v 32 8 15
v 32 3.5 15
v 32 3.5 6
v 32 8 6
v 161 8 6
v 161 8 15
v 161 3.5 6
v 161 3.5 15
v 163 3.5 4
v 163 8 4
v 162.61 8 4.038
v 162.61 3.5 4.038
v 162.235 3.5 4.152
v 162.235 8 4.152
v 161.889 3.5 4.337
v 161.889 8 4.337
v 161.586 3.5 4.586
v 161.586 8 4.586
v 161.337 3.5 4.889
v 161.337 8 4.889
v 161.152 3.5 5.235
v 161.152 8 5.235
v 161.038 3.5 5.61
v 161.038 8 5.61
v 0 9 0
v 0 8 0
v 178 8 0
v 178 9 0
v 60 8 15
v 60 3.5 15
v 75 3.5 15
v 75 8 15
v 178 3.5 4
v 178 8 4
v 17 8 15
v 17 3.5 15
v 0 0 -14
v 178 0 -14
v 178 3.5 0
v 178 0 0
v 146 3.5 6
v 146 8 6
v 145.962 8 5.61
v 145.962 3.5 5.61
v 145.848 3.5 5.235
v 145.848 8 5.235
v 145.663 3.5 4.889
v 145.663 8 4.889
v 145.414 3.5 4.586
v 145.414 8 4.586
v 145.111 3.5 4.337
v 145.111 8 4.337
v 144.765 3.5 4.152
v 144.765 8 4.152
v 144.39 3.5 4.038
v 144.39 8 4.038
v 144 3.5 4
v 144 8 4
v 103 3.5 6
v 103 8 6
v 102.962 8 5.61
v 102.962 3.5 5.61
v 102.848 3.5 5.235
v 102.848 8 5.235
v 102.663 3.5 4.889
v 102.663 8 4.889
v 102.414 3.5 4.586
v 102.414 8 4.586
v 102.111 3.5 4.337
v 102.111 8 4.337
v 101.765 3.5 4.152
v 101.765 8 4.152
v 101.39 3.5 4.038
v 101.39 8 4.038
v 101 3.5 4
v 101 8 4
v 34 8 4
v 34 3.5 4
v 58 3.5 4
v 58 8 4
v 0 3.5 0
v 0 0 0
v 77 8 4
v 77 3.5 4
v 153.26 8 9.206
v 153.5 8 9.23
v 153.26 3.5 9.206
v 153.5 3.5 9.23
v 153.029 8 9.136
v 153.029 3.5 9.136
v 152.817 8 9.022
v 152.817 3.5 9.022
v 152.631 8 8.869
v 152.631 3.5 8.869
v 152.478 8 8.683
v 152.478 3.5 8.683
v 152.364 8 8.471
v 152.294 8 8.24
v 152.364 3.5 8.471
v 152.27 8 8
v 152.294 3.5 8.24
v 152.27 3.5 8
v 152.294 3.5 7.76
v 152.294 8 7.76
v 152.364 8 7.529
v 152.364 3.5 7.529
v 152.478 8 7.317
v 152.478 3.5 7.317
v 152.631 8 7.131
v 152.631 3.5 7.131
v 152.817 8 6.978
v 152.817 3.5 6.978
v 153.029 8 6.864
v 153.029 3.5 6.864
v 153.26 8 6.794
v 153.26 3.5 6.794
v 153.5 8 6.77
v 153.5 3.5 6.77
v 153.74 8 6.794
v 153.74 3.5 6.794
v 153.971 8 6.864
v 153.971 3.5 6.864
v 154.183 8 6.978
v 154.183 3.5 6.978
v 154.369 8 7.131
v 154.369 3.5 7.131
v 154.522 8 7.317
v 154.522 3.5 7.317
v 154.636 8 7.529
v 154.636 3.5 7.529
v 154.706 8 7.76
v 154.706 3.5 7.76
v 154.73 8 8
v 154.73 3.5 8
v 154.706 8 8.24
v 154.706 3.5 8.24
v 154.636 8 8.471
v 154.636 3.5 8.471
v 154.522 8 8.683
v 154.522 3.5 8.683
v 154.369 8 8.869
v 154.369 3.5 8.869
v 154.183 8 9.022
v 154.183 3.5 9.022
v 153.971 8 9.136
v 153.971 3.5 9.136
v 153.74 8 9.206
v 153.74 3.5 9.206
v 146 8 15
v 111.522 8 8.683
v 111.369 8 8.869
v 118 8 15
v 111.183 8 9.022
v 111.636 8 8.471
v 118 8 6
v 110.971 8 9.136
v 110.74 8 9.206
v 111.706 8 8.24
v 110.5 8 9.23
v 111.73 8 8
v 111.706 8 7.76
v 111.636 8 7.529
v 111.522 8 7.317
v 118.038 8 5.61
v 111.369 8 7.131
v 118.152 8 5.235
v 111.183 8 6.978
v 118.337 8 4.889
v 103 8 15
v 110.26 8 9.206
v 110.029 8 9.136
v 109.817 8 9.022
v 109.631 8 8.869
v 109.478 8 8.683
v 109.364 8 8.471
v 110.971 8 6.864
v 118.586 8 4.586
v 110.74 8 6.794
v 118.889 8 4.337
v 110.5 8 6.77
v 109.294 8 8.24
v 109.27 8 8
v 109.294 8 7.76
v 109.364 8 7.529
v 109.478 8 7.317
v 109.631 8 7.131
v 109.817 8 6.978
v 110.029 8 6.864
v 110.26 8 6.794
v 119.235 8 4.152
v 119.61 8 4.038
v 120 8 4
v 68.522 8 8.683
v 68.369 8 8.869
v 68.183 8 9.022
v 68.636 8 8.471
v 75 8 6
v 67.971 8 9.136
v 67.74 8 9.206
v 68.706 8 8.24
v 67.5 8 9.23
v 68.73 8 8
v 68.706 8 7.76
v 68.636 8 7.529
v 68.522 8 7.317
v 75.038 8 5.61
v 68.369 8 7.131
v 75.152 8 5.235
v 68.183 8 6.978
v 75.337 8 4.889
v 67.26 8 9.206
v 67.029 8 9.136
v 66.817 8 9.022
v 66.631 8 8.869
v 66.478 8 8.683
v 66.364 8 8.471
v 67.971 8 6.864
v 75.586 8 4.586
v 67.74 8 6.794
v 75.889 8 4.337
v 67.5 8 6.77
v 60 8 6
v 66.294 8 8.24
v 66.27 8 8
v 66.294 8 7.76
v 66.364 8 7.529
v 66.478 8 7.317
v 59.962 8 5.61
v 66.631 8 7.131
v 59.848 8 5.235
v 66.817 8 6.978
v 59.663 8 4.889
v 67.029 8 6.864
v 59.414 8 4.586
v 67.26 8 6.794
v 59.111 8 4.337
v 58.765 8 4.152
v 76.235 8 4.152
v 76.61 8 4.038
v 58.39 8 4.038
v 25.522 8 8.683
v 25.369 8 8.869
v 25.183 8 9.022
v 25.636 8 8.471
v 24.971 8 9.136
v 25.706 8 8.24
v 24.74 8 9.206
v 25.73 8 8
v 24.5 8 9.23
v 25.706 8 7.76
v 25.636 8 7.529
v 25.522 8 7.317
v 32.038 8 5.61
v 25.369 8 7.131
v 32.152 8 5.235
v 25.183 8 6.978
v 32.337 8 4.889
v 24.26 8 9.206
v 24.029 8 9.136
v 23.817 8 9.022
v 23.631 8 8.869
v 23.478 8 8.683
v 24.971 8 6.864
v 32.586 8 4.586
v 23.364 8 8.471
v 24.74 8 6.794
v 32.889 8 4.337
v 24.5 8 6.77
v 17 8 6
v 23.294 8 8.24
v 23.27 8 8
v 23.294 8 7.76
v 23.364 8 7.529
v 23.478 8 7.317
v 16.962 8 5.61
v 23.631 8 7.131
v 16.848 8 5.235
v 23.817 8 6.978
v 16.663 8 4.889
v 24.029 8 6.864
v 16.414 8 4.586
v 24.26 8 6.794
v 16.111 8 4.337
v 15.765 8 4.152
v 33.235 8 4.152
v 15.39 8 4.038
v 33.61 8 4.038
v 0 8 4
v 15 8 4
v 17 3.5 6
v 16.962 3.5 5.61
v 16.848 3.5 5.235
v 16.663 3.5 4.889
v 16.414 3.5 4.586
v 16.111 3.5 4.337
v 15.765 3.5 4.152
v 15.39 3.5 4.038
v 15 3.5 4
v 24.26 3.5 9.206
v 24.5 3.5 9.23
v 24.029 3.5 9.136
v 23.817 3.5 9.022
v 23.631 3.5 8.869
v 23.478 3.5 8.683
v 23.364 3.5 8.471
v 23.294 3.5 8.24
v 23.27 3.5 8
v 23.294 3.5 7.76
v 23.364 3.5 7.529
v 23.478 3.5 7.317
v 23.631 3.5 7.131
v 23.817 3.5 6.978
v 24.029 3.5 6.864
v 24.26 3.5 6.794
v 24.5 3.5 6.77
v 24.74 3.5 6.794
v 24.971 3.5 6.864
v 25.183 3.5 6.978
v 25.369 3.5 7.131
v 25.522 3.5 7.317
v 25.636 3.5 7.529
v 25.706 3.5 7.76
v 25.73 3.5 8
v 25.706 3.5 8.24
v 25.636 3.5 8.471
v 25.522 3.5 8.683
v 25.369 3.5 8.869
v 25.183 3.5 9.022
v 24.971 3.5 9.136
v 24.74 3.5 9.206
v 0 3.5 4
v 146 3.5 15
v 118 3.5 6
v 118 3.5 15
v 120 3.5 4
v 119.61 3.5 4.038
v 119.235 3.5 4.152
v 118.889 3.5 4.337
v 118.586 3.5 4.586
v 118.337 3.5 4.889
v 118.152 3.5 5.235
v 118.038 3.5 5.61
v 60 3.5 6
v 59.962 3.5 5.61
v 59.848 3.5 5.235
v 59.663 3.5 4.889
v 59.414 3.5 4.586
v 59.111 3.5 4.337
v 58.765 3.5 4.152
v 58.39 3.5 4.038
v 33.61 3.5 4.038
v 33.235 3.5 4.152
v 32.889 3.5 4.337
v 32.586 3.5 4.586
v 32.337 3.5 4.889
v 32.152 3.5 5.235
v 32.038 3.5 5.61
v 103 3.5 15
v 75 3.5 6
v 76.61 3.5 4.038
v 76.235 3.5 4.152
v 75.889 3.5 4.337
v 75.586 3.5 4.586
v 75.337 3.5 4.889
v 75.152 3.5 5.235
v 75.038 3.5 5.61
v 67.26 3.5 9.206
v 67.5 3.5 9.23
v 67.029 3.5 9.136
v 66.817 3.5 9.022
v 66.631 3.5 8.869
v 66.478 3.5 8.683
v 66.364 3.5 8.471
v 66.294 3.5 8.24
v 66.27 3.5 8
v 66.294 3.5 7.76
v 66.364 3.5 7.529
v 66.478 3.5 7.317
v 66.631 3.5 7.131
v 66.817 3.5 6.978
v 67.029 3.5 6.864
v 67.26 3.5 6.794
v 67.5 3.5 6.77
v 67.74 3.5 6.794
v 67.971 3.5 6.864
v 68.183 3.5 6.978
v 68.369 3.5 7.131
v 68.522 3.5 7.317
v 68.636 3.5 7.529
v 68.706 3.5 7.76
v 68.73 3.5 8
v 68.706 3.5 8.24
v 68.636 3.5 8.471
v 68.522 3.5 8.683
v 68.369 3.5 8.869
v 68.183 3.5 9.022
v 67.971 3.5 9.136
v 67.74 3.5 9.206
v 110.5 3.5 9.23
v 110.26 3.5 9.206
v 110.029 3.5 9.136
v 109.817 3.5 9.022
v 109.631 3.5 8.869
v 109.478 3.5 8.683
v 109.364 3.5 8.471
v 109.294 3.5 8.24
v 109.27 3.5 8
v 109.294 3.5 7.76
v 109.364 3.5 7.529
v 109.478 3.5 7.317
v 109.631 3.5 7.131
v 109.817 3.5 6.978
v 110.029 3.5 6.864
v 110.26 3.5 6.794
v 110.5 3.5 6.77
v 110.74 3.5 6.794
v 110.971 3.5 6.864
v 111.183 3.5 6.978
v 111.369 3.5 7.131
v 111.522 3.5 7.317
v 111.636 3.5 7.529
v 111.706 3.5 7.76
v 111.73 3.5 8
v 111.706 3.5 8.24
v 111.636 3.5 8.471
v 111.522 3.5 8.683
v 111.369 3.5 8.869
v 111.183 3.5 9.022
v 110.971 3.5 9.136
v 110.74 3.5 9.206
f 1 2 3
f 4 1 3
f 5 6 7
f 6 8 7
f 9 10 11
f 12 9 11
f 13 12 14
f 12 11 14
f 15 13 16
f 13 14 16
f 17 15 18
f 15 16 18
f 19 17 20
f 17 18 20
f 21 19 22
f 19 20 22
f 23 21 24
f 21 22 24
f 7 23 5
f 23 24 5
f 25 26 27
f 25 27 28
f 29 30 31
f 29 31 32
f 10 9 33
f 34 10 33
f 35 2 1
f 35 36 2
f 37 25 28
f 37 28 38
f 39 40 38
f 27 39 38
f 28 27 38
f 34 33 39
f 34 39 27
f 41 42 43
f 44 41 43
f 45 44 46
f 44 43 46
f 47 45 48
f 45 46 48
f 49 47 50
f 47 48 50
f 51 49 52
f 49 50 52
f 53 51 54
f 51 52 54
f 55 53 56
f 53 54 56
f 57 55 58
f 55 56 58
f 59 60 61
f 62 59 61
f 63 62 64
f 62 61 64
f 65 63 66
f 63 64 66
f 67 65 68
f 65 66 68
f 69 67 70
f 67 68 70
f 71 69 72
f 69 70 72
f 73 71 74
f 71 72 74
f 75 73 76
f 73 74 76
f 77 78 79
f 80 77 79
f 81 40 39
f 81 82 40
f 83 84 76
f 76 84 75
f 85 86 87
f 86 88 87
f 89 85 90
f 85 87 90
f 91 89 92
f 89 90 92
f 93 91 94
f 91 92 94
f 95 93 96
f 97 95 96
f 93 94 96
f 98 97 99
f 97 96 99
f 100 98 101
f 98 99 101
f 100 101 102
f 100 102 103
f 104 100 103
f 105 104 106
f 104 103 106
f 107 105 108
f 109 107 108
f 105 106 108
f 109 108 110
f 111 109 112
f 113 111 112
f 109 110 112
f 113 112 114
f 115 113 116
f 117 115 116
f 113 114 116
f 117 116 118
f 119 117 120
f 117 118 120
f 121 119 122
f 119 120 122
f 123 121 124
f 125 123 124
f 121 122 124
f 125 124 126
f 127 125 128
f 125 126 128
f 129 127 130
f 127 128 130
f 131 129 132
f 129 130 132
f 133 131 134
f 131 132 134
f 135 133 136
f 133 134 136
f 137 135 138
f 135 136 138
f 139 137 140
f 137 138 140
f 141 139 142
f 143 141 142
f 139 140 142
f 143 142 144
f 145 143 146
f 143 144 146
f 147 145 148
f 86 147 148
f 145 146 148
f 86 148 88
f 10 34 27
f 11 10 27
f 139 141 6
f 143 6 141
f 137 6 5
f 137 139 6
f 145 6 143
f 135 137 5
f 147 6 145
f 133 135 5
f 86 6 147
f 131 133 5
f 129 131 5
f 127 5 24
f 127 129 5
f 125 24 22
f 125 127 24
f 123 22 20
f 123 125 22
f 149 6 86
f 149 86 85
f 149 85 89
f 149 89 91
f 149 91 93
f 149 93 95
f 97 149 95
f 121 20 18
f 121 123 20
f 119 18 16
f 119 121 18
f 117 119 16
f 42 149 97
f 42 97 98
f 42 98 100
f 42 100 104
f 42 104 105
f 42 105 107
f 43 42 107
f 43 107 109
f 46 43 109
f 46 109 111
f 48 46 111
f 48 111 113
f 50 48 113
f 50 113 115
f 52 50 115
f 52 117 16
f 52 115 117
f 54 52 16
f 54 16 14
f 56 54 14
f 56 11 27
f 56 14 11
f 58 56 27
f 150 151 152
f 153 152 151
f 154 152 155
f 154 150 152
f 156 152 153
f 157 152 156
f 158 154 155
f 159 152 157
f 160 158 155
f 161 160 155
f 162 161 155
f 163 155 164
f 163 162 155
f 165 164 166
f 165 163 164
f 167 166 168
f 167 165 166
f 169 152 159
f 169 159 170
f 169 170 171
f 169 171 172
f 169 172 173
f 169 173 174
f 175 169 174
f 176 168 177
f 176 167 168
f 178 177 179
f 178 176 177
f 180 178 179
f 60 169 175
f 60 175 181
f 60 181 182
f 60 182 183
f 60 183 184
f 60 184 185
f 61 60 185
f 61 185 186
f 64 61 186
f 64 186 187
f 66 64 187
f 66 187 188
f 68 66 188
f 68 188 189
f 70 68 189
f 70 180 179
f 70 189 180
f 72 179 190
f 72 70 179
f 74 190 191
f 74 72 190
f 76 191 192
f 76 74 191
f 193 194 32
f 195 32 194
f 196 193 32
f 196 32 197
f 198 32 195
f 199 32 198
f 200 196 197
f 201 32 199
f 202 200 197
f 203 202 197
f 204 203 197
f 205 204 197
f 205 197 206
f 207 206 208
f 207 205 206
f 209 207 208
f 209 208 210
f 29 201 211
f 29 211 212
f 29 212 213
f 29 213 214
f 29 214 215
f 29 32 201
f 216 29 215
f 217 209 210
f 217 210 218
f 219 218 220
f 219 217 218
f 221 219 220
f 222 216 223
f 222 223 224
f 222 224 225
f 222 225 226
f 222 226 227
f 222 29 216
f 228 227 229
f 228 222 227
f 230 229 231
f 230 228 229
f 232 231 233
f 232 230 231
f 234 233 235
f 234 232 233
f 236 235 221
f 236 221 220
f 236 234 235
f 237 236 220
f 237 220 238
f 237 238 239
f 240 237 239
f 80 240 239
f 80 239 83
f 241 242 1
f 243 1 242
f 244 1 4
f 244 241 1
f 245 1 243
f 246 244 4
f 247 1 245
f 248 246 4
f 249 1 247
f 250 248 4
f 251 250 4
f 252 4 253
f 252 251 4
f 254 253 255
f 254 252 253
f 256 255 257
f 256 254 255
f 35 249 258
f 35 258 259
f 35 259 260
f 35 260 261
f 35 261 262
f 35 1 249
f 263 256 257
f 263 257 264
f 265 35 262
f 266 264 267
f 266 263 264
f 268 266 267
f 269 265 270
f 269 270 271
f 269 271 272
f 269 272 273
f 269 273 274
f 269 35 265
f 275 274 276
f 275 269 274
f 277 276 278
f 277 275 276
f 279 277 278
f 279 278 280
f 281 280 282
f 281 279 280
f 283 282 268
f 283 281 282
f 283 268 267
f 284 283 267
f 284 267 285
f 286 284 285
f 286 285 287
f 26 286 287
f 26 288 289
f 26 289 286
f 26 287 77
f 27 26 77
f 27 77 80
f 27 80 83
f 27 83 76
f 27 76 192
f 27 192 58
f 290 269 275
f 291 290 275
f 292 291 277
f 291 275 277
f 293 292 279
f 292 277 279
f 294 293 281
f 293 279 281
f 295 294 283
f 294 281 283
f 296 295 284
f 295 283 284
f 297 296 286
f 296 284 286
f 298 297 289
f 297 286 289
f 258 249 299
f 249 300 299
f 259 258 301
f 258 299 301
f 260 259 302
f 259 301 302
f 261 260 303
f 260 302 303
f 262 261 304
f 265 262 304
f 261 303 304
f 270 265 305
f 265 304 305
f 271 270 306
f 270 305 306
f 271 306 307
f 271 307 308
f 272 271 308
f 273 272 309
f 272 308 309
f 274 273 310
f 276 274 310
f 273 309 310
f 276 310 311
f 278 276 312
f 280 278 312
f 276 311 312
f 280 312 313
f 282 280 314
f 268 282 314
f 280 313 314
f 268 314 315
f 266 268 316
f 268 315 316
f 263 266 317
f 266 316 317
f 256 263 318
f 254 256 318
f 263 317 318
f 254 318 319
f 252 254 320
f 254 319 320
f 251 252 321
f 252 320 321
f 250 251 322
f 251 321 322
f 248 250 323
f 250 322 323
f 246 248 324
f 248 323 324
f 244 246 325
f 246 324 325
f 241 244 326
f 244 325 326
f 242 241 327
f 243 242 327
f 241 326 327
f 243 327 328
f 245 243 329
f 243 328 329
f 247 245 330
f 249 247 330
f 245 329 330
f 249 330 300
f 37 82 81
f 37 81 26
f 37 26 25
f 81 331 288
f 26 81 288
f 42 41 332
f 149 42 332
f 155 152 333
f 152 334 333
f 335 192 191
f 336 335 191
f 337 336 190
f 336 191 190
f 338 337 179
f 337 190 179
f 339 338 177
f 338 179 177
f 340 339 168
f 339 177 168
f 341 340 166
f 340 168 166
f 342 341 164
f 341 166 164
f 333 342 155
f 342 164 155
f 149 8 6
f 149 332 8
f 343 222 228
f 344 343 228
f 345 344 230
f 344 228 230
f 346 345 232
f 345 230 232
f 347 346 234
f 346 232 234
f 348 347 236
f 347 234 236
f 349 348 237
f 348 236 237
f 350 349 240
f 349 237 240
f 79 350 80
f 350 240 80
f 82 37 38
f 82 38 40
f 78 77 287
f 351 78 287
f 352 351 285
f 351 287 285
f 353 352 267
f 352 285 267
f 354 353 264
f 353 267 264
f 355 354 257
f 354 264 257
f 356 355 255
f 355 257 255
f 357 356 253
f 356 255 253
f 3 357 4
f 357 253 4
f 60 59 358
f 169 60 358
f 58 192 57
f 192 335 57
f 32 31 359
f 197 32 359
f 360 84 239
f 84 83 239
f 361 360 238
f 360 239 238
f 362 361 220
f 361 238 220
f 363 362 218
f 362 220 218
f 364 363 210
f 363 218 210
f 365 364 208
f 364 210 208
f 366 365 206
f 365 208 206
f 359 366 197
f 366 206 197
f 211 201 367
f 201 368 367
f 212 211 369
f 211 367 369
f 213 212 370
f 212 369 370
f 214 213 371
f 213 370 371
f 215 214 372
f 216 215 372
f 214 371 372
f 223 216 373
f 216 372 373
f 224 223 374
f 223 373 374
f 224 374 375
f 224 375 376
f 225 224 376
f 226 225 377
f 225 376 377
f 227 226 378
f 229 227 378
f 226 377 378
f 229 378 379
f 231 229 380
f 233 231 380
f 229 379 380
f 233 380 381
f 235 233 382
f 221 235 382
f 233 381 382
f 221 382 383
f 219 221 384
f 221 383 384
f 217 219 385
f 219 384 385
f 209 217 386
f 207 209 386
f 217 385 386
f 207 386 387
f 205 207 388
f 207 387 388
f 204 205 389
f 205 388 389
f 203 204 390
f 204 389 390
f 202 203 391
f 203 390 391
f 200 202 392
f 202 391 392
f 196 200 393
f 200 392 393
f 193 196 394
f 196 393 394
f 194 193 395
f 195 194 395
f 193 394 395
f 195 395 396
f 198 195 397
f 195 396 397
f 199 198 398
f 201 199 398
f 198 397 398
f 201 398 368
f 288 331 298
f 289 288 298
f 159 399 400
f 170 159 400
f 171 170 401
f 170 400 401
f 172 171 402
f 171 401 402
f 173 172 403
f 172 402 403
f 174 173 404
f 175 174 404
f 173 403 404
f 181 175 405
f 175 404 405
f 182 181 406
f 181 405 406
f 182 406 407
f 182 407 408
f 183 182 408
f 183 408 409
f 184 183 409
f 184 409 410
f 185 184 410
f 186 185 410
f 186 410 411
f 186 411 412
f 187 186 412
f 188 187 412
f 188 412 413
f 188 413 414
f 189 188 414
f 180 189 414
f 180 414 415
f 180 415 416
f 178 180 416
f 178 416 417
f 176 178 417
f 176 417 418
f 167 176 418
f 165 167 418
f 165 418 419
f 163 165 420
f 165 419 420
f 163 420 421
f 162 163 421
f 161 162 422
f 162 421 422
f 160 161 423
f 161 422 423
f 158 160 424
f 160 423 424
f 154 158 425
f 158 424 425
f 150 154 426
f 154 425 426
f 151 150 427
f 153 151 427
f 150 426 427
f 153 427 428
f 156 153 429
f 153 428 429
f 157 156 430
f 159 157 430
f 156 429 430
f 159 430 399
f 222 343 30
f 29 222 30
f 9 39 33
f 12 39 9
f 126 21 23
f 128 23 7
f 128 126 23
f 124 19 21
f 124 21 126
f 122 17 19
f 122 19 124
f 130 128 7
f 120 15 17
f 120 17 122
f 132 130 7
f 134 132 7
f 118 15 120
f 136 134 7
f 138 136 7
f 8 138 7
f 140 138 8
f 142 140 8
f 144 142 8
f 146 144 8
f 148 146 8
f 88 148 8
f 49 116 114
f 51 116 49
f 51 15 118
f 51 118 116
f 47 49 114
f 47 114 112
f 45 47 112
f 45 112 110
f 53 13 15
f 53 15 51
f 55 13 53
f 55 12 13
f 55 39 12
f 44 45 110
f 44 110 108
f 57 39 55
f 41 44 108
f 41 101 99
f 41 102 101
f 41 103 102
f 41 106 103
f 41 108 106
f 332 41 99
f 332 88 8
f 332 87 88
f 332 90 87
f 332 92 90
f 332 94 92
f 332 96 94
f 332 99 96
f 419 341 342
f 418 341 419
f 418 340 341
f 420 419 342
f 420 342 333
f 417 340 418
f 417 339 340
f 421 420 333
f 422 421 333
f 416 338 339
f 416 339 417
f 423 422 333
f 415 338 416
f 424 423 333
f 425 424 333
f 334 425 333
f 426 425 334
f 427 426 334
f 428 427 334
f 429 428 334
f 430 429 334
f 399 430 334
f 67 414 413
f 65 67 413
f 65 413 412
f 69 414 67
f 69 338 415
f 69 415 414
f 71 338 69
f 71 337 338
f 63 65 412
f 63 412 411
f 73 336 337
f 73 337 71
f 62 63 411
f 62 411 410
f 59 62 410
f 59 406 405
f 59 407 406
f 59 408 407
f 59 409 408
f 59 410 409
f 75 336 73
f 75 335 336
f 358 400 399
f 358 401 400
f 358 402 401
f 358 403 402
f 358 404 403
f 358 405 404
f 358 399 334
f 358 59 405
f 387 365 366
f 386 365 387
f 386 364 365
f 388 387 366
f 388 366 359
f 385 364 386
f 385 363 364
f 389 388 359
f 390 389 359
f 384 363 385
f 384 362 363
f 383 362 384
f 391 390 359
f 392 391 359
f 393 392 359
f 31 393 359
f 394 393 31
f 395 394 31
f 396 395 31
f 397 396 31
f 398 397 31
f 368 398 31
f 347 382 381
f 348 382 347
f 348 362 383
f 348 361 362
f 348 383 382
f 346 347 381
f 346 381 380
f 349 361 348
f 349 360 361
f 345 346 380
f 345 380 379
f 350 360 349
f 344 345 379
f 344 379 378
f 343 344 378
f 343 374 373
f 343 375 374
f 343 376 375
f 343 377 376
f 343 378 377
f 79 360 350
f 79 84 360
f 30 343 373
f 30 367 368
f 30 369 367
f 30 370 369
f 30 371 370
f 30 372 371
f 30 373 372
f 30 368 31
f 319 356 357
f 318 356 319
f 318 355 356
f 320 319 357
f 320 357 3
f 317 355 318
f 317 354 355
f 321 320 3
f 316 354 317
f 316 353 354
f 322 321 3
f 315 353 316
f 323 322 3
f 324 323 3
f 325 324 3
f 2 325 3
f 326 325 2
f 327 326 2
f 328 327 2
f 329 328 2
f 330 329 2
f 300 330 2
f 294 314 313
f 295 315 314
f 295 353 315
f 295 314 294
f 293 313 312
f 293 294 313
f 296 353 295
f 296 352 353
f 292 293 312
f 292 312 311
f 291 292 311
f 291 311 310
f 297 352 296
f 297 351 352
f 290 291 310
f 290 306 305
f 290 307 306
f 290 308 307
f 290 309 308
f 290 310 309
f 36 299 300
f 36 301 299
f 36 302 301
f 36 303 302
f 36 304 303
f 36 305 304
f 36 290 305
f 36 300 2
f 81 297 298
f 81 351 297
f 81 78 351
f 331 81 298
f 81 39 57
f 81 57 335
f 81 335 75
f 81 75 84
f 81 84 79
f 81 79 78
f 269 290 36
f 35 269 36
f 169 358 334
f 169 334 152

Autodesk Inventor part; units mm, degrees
ref_plane "YZ Plane" through (0, 0, 0) normal (1, 0, 0) x (0, 1, 0)
ref_plane "XZ Plane" through (0, 0, 0) normal (0, 1, 0) x (-1, 0, 0)
ref_plane "XY Plane" through (0, 0, 0) normal (0, 0, 1) x (1, 0, 0)
sketch "Sketch3" plane through (0, 0, 0) normal (1, 0, 0) x (0, 1, 0)
  line L0 (0, 0) -> (9, 0)
  line L1 (9, 0) -> (9, -14)
  line L2 (9, -14) -> (0, -14)
  line L3 (0, -14) -> (0, 0)
  line L4 (9, 0) -> (0, -14)
  line L5 (8, 0) -> (3.5, 0)
  line L6 (3.5, 0) -> (3.5, 15)
  line L7 (3.5, 15) -> (8, 15)
  line L8 (8, 15) -> (8, 0)
  line L9 (8.5, 0) -> (8, 0)
  line L10 (8, 0) -> (8, 4)
  point P0 (3.5, 0)
  dimension "d30" = 15
  dimension "d31" = 4.5
  dimension "d63" = 9
  dimension "d141" = 32.735
  dimension "d142" = 14
  dimension "d143" = 3.5
  dimension "d144" = 1
extrude "Extrusion2" add sketch "Sketch3" along normal blind 178 contours L0 L4 L3 | L6 L7 L8 L0
sketch "Sketch10" plane through (0, 3.5, -14) normal (0, -1, 0) x (1, 0, 0)
  line L0 (0, 14) -> (0, 26)
  line L1 (0, 26) -> (178, 26)
  line L2 (178, 14) -> (178, 26)
  line L3 (0, 14) -> (0, 18)
  line L4 (0, 18) -> (17, 18)
  line L5 (17, 18) -> (17, 26)
  line L6 (17, 26) -> (0, 26)
  line L7 (0, 26) -> (0, 18)
  line L8 (0, 18) -> (178, 18)
  line L9 (178, 26) -> (161, 26)
  line L10 (161, 26) -> (161, 18)
  line L11 (161, 18) -> (178, 18)
  line L12 (178, 18) -> (178, 26)
  line L13 (17, 26) -> (32, 26)
  line L14 (32, 26) -> (32, 18)
  line L15 (32, 18) -> (17, 18)
  line L16 (17, 18) -> (17, 26)
  line L17 (60, 26) -> (75, 26)
  line L18 (75, 26) -> (75, 18)
  line L19 (75, 18) -> (60, 18)
  line L20 (60, 18) -> (60, 26)
  line L21 (103, 26) -> (118, 26)
  line L22 (118, 26) -> (118, 18)
  line L23 (118, 18) -> (103, 18)
  line L24 (103, 18) -> (103, 26)
  line L25 (146, 26) -> (161, 26)
  line L26 (161, 26) -> (161, 18)
  line L27 (161, 18) -> (146, 18)
  line L28 (146, 18) -> (146, 26)
  line L29 (17, 26) -> (32, 18)
  line L30 (32, 26) -> (17, 18)
  line L31 (60, 26) -> (75, 18)
  line L32 (75, 26) -> (60, 18)
  line L33 (103, 26) -> (118, 18)
  line L34 (118, 26) -> (103, 18)
  line L35 (146, 26) -> (161, 18)
  line L36 (161, 26) -> (146, 18)
  line L37 (0, 14) -> (178, 14)
  line L38 (178, 26) -> (161, 26)
  line L39 (161, 26) -> (161, 33.1494)
  line L40 (161, 33.1494) -> (178, 33.1494)
  line L41 (178, 33.1494) -> (178, 26)
  line L42 (146, 26) -> (118, 26)
  line L43 (118, 26) -> (118, 37.5544)
  line L44 (118, 37.5544) -> (146, 37.5544)
  line L45 (146, 37.5544) -> (146, 26)
  line L46 (103, 26) -> (75, 26)
  line L47 (75, 26) -> (75, 36.0625)
  line L48 (75, 36.0625) -> (103, 36.0625)
  line L49 (103, 36.0625) -> (103, 26)
  line L50 (60, 26) -> (32, 26)
  line L51 (32, 26) -> (32, 34.4304)
  line L52 (32, 34.4304) -> (60, 34.4304)
  line L53 (60, 34.4304) -> (60, 26)
  line L54 (17, 26) -> (0, 26)
  line L55 (0, 26) -> (0, 37.0756)
  line L56 (0, 37.0756) -> (17, 37.0756)
  line L57 (17, 37.0756) -> (17, 26)
  point P0 (118, 26)
  point P1 (24.5, 22)
  point P2 (67.5, 22)
  point P3 (110.5, 22)
  point P4 (153.5, 22)
  dimension "d118" = 17
  dimension "d119" = 17
  dimension "d120" = 15
  dimension "d121" = 15
  dimension "d122" = 15
  dimension "d123" = 15
  dimension "d124" = 0
  dimension "d125" = 0
  dimension "d126" = 28
  dimension "d129" = 28
  dimension "d130" = 28
extrude "Extrusion5" cut sketch "Sketch10" against normal up to next contours L0 L1 L5 L4 | L55 L56 L57 L1 | L8 L10 L1 L2 | L14 L1 L20 L8 | L1 L39 L40 L41 | L51 L52 L53 L1 | L8 L22 L1 L28 | L18 L1 L24 L8 | L1 L43 L44 L45 | L47 L48 L49 L1
fillet "Fillet3" radius 2 8 edges at (161, 5.75, 4) (146, 5.75, 4) (118, 5.75, 4) (103, 5.75, 4) (75, 5.75, 4) (60, 5.75, 4) (32, 5.75, 4) (17, 5.75, 4)
sketch "Sketch11" plane through (0, 8, 0) normal (0, 1, 0) x (1, 0, 0)
  point P0 (0, 0)
  point P1 (24.5, -8)
  point P2 (67.5, -8)
  point P3 (110.5, -8)
  point P4 (153.5, -8)
hole "Hole5" at (24.5, 8, 8) at (67.5, 8, 8) at (110.5, 8, 8) at (153.5, 8, 8) direction (0, -1, 0) diameter 2.459 depth 8.8 thread size "M3x0.5" class "6H" standard "ISO Metric profile"
equation "\"d126\" = d130"
equation "\"d129\" = d130"
properties part number "plog" material "Steel, Alloy"
